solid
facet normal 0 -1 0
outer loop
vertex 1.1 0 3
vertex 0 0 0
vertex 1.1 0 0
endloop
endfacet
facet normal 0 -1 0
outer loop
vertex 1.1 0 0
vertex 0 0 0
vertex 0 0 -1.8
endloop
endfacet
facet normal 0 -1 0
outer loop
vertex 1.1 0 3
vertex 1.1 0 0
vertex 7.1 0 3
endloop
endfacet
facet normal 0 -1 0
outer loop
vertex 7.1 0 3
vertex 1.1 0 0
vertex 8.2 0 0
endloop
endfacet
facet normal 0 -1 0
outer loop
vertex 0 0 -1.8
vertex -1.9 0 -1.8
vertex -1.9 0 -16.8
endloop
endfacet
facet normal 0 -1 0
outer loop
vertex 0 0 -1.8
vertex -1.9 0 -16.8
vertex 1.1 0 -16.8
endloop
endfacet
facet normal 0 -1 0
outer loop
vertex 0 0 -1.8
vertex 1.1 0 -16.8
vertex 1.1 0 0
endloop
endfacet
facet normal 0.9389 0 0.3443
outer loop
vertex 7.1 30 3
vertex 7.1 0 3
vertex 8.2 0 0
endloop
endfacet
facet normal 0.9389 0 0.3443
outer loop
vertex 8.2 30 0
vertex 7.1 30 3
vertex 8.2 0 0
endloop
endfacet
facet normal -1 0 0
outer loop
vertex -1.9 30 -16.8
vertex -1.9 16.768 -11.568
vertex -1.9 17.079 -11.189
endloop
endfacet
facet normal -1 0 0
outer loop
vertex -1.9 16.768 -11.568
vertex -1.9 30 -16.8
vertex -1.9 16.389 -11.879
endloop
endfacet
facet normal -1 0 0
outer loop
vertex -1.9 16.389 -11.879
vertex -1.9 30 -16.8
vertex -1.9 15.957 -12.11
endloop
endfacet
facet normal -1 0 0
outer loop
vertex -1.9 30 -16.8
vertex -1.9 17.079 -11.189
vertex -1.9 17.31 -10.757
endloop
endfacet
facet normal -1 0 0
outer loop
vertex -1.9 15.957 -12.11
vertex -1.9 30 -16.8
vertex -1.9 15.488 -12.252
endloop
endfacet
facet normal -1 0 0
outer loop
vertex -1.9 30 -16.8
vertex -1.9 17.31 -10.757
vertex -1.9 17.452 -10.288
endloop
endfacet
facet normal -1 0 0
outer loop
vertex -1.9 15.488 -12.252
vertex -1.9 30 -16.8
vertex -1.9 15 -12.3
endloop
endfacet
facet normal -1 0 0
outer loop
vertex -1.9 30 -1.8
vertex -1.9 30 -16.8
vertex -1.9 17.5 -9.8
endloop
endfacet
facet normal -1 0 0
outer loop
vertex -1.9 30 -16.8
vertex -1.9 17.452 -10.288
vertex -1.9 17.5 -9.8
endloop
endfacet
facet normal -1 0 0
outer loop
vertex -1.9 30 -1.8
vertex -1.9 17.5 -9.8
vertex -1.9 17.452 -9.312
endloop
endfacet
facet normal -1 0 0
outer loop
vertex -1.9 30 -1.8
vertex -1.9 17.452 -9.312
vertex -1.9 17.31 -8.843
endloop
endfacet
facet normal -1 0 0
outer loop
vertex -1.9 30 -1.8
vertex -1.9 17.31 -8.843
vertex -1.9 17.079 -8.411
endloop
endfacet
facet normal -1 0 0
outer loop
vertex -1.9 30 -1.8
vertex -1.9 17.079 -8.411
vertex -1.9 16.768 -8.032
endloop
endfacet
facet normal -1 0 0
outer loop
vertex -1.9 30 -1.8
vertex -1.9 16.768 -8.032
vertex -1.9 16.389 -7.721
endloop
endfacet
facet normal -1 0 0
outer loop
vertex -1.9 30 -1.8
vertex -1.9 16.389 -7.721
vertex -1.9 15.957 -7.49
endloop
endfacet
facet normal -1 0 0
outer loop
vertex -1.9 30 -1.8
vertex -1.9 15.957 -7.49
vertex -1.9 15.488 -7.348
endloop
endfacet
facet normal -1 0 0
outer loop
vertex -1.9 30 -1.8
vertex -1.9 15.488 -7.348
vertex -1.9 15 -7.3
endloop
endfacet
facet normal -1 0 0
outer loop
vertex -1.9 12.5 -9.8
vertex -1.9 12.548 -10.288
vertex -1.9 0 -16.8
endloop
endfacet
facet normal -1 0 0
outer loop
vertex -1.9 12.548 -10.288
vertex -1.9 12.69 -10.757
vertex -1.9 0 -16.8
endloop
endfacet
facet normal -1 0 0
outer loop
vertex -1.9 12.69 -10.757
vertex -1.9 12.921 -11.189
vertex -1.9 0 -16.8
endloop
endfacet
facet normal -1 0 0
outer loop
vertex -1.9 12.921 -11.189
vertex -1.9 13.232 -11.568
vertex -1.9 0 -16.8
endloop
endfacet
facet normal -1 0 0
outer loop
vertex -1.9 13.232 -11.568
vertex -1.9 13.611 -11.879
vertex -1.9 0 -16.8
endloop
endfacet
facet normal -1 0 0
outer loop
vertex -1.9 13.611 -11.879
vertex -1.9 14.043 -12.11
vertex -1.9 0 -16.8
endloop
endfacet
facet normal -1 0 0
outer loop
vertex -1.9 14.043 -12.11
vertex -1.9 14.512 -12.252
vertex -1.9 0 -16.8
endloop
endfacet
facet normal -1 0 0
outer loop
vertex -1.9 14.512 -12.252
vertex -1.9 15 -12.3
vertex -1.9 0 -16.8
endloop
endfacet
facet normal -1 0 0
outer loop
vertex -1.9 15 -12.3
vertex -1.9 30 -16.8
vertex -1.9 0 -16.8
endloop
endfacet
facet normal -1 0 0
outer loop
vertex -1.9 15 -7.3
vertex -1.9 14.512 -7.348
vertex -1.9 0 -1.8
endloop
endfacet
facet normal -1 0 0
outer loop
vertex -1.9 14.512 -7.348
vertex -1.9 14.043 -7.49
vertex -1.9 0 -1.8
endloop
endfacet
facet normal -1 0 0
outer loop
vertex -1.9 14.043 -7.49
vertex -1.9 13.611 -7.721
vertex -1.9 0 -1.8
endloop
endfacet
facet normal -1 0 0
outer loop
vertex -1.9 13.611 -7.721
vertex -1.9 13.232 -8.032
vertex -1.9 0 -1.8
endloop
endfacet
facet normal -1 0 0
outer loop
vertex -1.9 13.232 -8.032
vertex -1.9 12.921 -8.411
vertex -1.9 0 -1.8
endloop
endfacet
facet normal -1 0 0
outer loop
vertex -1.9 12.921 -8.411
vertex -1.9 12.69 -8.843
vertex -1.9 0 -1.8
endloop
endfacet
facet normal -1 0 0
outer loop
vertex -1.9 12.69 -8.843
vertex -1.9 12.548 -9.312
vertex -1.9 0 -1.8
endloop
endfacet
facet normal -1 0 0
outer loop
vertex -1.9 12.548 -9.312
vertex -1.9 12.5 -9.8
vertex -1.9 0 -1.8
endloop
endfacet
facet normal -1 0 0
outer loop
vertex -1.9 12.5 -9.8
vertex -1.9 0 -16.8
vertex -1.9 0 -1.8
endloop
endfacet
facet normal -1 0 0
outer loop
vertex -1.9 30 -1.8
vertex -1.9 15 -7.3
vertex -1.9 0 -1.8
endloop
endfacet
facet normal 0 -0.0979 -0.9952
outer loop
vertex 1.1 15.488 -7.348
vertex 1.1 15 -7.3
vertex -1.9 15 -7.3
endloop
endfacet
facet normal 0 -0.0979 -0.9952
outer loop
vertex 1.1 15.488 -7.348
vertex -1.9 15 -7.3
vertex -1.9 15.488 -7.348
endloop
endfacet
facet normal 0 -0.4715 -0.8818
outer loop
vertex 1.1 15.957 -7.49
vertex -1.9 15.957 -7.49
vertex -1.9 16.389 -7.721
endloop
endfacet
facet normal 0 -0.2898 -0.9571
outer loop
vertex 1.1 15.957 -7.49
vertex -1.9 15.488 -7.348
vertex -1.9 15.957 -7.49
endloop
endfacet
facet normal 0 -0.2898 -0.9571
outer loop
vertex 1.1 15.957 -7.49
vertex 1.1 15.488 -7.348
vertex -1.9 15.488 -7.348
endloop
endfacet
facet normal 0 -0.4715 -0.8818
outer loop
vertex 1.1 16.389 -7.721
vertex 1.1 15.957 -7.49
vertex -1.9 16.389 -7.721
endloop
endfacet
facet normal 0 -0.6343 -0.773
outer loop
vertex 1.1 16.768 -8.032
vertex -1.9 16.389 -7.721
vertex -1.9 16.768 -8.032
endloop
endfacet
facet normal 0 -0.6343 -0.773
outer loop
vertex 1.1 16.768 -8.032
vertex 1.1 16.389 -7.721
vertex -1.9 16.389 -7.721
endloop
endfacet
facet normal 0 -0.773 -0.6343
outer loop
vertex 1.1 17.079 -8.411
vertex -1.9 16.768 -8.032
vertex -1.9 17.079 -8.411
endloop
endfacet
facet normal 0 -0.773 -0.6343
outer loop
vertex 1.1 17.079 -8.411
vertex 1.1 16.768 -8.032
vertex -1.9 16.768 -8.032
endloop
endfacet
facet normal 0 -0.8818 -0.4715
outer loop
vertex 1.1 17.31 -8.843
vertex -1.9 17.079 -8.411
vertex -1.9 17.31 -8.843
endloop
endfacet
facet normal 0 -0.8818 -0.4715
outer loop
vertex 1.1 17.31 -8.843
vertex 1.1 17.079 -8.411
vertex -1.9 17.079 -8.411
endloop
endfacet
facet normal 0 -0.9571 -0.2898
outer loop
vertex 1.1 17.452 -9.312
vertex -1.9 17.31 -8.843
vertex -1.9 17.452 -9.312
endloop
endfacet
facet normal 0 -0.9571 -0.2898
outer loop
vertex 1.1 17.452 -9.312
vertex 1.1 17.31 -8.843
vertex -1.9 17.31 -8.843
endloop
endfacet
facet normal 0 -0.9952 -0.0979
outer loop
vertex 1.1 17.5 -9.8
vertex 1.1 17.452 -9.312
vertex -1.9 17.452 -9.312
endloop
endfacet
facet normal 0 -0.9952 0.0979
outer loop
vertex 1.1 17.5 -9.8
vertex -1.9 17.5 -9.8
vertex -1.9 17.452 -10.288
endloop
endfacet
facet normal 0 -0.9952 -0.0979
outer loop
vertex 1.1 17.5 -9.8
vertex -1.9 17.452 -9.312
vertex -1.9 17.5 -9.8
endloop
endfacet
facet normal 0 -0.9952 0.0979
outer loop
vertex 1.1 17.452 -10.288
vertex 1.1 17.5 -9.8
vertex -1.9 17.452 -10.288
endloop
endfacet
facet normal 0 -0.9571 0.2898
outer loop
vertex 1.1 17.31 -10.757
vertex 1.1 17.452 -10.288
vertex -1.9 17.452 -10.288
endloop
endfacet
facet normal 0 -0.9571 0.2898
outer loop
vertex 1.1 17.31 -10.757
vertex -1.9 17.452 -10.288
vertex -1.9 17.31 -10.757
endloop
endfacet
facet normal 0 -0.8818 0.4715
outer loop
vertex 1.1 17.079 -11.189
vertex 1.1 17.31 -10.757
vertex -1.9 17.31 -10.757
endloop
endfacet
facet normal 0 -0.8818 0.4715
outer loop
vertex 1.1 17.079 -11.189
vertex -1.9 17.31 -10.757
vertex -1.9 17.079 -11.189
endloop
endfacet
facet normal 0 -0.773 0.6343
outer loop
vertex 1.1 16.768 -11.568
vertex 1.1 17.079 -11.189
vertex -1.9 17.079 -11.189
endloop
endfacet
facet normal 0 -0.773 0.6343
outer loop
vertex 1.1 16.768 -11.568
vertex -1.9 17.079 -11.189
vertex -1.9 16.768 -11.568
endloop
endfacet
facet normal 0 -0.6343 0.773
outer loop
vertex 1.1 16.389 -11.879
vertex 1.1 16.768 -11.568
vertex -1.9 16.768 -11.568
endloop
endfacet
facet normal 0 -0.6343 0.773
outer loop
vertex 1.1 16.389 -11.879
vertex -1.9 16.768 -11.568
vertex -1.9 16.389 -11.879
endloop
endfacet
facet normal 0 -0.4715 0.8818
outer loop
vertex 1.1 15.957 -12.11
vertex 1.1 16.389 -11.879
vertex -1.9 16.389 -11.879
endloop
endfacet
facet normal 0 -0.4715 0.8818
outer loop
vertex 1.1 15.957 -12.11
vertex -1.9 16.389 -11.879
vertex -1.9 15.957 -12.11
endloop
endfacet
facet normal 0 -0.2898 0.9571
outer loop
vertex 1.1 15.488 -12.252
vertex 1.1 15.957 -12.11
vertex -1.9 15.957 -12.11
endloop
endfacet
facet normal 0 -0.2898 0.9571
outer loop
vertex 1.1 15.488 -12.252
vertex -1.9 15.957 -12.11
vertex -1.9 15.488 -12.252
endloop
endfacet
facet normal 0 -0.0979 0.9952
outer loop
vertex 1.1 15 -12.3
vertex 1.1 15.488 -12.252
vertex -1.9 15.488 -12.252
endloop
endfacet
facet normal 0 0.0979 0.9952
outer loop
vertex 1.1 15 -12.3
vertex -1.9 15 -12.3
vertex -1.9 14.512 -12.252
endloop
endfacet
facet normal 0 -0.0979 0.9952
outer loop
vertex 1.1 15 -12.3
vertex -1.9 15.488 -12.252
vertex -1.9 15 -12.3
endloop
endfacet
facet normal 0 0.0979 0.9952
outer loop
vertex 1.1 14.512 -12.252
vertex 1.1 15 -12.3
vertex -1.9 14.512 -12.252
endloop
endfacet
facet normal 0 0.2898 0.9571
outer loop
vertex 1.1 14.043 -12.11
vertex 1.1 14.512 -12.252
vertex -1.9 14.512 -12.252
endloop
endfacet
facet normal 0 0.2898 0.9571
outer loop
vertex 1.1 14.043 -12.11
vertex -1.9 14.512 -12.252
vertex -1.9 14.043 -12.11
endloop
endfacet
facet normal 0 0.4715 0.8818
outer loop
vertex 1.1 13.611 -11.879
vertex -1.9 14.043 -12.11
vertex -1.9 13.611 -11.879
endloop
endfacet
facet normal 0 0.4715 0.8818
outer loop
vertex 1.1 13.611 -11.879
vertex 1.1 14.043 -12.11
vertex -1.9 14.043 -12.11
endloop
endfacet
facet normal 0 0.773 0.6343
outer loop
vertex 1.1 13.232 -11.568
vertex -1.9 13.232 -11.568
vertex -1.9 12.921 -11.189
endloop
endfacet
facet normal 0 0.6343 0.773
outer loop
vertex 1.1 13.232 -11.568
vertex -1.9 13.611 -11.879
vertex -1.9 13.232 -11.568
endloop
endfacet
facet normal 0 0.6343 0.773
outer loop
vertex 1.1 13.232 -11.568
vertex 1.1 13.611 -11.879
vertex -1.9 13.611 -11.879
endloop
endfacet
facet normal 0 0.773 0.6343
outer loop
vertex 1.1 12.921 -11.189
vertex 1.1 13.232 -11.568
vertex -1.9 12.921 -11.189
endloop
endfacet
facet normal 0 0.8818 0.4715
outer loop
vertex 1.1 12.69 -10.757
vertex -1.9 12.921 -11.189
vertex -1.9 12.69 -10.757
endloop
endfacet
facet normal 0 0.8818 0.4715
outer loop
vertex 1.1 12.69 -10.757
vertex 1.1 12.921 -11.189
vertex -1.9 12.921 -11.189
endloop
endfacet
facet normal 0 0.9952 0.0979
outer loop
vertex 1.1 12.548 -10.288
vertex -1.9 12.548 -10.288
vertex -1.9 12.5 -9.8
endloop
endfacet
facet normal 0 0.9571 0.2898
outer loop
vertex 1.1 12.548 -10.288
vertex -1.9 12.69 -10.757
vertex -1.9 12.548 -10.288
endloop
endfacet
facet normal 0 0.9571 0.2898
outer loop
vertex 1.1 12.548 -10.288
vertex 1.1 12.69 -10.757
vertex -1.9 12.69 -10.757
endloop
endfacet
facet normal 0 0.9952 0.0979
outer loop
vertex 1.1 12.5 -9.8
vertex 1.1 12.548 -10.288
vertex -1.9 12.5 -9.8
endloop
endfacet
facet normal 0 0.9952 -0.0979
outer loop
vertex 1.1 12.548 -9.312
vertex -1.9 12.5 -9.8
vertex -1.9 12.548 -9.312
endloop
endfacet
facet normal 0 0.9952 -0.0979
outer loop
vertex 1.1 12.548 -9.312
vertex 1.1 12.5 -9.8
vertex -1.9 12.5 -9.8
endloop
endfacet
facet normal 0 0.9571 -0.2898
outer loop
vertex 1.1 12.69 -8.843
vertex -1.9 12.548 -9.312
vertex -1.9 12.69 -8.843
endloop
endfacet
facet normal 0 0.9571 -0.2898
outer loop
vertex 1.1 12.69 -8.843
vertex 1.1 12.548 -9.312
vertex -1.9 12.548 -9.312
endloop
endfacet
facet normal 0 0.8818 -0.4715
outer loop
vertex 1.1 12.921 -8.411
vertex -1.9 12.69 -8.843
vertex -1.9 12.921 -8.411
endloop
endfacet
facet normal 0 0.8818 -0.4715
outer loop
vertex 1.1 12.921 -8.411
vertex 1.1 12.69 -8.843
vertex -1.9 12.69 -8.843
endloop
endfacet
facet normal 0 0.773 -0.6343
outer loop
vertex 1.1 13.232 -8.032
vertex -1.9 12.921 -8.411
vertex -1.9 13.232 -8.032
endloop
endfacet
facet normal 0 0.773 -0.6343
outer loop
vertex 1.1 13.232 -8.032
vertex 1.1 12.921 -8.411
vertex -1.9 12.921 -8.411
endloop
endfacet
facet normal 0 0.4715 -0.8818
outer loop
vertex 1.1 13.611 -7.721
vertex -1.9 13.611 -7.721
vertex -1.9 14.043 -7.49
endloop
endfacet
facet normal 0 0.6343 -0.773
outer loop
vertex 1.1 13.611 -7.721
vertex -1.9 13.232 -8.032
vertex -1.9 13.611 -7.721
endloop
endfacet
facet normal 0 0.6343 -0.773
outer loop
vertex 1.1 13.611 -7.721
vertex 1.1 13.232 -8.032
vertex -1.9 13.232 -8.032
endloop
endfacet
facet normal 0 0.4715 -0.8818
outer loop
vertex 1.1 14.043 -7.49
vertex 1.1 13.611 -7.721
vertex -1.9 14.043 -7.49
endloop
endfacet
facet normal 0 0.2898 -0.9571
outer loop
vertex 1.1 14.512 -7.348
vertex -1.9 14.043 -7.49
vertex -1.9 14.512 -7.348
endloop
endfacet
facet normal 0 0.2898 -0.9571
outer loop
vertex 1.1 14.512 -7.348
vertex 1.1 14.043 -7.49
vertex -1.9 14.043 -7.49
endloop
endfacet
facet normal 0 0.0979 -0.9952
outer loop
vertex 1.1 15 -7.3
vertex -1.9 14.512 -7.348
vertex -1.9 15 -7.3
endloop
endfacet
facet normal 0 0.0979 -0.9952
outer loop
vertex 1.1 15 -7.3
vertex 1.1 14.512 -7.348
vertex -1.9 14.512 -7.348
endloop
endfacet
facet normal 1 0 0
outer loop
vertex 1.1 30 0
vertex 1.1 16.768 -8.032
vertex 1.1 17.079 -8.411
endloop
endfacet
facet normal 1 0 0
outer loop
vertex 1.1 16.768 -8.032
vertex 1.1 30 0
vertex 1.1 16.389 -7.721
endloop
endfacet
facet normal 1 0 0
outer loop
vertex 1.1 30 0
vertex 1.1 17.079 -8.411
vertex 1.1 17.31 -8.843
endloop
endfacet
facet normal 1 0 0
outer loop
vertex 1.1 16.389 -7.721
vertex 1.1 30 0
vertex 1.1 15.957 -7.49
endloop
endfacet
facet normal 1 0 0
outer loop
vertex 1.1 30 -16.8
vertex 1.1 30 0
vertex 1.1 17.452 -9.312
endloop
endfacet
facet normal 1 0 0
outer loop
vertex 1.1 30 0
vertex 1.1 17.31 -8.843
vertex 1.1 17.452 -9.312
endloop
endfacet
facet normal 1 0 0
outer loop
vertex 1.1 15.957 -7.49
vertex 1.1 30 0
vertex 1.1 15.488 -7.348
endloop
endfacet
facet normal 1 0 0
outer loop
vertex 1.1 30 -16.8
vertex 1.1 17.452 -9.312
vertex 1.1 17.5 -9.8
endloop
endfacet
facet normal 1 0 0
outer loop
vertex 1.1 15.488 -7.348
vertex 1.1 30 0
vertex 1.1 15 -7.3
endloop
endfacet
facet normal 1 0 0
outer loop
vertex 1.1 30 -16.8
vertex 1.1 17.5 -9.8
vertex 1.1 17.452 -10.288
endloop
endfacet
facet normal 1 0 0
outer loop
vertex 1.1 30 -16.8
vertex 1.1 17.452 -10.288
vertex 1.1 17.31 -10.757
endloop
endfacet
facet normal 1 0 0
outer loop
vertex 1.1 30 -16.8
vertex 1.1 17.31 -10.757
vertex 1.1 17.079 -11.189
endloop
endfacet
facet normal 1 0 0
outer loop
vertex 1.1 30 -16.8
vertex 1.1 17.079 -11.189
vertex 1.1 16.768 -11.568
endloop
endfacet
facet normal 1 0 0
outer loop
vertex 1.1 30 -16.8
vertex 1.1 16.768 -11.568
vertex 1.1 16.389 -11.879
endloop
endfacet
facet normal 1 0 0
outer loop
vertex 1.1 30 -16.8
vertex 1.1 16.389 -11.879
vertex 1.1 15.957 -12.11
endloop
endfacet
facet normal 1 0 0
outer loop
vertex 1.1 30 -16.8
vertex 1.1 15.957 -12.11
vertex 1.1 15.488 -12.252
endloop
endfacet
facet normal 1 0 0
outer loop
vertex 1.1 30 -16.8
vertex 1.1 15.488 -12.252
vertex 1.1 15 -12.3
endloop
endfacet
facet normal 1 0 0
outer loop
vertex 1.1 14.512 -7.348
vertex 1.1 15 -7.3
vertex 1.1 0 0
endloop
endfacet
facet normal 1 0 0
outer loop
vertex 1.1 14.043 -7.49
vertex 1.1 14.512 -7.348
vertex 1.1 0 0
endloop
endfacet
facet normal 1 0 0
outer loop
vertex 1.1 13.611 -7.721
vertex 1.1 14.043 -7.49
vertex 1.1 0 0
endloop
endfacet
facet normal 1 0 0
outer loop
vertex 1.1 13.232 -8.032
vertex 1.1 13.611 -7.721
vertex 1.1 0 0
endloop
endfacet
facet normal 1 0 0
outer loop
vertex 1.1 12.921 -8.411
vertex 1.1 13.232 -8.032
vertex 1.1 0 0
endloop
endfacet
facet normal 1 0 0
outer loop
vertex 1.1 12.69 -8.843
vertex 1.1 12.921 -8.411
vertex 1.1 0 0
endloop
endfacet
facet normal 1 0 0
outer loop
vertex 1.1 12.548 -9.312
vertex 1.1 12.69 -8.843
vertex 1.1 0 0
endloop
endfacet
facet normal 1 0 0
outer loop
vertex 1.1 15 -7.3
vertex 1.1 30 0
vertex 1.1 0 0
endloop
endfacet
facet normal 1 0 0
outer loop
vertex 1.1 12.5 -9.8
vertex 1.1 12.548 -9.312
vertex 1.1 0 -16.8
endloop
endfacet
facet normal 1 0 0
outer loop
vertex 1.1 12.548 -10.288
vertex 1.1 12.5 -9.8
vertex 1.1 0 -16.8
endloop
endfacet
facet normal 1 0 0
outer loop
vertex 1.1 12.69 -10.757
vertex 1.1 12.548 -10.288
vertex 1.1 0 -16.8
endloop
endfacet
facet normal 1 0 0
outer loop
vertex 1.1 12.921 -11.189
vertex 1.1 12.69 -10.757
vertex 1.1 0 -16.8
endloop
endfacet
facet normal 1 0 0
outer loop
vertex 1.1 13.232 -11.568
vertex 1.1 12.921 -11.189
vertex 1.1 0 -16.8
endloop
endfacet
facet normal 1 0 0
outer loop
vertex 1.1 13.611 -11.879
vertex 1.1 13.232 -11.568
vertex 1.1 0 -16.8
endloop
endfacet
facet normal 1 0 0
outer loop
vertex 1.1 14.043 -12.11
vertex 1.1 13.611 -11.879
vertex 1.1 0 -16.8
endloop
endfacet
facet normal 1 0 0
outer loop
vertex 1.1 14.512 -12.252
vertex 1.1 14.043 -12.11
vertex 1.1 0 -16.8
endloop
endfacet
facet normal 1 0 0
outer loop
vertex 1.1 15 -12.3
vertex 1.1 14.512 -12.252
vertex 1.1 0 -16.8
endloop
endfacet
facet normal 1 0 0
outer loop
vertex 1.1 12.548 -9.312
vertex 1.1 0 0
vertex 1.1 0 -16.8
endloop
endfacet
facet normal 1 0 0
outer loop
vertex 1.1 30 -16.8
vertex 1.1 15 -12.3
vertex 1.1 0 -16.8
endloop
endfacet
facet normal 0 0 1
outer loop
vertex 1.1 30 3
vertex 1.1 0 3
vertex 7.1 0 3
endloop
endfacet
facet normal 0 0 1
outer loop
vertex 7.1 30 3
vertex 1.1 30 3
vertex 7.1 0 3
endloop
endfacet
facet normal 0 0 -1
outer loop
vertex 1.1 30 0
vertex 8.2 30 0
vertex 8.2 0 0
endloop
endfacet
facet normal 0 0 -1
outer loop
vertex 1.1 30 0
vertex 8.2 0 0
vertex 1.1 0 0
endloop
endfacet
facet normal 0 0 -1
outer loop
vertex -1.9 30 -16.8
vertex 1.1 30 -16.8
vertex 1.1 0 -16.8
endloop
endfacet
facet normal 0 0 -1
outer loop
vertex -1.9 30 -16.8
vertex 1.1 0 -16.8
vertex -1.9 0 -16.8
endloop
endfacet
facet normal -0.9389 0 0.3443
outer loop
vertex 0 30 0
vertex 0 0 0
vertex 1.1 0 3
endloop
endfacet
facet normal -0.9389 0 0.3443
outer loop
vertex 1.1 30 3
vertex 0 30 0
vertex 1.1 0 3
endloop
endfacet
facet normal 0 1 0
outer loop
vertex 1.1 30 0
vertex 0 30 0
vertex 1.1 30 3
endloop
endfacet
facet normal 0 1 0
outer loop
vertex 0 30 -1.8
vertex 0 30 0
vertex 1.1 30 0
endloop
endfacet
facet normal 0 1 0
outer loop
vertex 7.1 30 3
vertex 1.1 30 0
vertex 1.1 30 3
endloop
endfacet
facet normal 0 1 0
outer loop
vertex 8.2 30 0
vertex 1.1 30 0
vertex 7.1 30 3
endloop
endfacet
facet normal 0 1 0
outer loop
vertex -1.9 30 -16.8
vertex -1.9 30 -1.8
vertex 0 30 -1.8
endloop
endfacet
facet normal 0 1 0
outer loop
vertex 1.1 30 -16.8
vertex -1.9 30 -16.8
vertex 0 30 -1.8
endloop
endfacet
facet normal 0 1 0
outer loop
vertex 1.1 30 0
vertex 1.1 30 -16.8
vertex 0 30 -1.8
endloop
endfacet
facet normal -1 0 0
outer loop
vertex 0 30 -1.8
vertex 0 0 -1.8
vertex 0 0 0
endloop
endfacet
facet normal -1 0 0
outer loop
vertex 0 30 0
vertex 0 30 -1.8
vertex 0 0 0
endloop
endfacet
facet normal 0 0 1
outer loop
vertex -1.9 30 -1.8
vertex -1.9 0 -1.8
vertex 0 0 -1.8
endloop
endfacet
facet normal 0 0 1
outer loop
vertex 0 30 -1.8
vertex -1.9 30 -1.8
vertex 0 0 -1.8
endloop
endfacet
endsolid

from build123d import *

# Parameters (mm, degrees)
EXTRUDE_1_DEPTH          = 30
CUT_EXTRUDE_1_DEPTH      = 36.836433974
CUT_EXTRUDE_1_DEPTH_BACK = 36.836433974
SKETCH_2_R               = 2.5


with BuildPart() as part:
    # 草图1 → 凸台-拉伸1 (new body)
    with BuildSketch(Plane(origin=(0, 0, 0), x_dir=(1, 0, 0), z_dir=(0, 1, 0))):
        Polygon((0, 1.8), (0, 0), (1.1, 0), (1.1, 16.8), (-1.9, 16.8), (-1.9, 1.8), align=None)
        Polygon((1.1, -3), (7.1, -3), (8.2, 0), (0, 0), align=None)
    extrude(amount=EXTRUDE_1_DEPTH)

    # 草图2 → 切除-拉伸1 (cut, two sides: drawn at the far end of the back side and taken through both)
    with BuildSketch(Plane.ZY.offset(1.9).offset(-CUT_EXTRUDE_1_DEPTH_BACK)):
        with Locations((-9.8, 15)):
            Circle(SKETCH_2_R)
    extrude(amount=CUT_EXTRUDE_1_DEPTH + CUT_EXTRUDE_1_DEPTH_BACK, mode=Mode.SUBTRACT)


solid = part.part
